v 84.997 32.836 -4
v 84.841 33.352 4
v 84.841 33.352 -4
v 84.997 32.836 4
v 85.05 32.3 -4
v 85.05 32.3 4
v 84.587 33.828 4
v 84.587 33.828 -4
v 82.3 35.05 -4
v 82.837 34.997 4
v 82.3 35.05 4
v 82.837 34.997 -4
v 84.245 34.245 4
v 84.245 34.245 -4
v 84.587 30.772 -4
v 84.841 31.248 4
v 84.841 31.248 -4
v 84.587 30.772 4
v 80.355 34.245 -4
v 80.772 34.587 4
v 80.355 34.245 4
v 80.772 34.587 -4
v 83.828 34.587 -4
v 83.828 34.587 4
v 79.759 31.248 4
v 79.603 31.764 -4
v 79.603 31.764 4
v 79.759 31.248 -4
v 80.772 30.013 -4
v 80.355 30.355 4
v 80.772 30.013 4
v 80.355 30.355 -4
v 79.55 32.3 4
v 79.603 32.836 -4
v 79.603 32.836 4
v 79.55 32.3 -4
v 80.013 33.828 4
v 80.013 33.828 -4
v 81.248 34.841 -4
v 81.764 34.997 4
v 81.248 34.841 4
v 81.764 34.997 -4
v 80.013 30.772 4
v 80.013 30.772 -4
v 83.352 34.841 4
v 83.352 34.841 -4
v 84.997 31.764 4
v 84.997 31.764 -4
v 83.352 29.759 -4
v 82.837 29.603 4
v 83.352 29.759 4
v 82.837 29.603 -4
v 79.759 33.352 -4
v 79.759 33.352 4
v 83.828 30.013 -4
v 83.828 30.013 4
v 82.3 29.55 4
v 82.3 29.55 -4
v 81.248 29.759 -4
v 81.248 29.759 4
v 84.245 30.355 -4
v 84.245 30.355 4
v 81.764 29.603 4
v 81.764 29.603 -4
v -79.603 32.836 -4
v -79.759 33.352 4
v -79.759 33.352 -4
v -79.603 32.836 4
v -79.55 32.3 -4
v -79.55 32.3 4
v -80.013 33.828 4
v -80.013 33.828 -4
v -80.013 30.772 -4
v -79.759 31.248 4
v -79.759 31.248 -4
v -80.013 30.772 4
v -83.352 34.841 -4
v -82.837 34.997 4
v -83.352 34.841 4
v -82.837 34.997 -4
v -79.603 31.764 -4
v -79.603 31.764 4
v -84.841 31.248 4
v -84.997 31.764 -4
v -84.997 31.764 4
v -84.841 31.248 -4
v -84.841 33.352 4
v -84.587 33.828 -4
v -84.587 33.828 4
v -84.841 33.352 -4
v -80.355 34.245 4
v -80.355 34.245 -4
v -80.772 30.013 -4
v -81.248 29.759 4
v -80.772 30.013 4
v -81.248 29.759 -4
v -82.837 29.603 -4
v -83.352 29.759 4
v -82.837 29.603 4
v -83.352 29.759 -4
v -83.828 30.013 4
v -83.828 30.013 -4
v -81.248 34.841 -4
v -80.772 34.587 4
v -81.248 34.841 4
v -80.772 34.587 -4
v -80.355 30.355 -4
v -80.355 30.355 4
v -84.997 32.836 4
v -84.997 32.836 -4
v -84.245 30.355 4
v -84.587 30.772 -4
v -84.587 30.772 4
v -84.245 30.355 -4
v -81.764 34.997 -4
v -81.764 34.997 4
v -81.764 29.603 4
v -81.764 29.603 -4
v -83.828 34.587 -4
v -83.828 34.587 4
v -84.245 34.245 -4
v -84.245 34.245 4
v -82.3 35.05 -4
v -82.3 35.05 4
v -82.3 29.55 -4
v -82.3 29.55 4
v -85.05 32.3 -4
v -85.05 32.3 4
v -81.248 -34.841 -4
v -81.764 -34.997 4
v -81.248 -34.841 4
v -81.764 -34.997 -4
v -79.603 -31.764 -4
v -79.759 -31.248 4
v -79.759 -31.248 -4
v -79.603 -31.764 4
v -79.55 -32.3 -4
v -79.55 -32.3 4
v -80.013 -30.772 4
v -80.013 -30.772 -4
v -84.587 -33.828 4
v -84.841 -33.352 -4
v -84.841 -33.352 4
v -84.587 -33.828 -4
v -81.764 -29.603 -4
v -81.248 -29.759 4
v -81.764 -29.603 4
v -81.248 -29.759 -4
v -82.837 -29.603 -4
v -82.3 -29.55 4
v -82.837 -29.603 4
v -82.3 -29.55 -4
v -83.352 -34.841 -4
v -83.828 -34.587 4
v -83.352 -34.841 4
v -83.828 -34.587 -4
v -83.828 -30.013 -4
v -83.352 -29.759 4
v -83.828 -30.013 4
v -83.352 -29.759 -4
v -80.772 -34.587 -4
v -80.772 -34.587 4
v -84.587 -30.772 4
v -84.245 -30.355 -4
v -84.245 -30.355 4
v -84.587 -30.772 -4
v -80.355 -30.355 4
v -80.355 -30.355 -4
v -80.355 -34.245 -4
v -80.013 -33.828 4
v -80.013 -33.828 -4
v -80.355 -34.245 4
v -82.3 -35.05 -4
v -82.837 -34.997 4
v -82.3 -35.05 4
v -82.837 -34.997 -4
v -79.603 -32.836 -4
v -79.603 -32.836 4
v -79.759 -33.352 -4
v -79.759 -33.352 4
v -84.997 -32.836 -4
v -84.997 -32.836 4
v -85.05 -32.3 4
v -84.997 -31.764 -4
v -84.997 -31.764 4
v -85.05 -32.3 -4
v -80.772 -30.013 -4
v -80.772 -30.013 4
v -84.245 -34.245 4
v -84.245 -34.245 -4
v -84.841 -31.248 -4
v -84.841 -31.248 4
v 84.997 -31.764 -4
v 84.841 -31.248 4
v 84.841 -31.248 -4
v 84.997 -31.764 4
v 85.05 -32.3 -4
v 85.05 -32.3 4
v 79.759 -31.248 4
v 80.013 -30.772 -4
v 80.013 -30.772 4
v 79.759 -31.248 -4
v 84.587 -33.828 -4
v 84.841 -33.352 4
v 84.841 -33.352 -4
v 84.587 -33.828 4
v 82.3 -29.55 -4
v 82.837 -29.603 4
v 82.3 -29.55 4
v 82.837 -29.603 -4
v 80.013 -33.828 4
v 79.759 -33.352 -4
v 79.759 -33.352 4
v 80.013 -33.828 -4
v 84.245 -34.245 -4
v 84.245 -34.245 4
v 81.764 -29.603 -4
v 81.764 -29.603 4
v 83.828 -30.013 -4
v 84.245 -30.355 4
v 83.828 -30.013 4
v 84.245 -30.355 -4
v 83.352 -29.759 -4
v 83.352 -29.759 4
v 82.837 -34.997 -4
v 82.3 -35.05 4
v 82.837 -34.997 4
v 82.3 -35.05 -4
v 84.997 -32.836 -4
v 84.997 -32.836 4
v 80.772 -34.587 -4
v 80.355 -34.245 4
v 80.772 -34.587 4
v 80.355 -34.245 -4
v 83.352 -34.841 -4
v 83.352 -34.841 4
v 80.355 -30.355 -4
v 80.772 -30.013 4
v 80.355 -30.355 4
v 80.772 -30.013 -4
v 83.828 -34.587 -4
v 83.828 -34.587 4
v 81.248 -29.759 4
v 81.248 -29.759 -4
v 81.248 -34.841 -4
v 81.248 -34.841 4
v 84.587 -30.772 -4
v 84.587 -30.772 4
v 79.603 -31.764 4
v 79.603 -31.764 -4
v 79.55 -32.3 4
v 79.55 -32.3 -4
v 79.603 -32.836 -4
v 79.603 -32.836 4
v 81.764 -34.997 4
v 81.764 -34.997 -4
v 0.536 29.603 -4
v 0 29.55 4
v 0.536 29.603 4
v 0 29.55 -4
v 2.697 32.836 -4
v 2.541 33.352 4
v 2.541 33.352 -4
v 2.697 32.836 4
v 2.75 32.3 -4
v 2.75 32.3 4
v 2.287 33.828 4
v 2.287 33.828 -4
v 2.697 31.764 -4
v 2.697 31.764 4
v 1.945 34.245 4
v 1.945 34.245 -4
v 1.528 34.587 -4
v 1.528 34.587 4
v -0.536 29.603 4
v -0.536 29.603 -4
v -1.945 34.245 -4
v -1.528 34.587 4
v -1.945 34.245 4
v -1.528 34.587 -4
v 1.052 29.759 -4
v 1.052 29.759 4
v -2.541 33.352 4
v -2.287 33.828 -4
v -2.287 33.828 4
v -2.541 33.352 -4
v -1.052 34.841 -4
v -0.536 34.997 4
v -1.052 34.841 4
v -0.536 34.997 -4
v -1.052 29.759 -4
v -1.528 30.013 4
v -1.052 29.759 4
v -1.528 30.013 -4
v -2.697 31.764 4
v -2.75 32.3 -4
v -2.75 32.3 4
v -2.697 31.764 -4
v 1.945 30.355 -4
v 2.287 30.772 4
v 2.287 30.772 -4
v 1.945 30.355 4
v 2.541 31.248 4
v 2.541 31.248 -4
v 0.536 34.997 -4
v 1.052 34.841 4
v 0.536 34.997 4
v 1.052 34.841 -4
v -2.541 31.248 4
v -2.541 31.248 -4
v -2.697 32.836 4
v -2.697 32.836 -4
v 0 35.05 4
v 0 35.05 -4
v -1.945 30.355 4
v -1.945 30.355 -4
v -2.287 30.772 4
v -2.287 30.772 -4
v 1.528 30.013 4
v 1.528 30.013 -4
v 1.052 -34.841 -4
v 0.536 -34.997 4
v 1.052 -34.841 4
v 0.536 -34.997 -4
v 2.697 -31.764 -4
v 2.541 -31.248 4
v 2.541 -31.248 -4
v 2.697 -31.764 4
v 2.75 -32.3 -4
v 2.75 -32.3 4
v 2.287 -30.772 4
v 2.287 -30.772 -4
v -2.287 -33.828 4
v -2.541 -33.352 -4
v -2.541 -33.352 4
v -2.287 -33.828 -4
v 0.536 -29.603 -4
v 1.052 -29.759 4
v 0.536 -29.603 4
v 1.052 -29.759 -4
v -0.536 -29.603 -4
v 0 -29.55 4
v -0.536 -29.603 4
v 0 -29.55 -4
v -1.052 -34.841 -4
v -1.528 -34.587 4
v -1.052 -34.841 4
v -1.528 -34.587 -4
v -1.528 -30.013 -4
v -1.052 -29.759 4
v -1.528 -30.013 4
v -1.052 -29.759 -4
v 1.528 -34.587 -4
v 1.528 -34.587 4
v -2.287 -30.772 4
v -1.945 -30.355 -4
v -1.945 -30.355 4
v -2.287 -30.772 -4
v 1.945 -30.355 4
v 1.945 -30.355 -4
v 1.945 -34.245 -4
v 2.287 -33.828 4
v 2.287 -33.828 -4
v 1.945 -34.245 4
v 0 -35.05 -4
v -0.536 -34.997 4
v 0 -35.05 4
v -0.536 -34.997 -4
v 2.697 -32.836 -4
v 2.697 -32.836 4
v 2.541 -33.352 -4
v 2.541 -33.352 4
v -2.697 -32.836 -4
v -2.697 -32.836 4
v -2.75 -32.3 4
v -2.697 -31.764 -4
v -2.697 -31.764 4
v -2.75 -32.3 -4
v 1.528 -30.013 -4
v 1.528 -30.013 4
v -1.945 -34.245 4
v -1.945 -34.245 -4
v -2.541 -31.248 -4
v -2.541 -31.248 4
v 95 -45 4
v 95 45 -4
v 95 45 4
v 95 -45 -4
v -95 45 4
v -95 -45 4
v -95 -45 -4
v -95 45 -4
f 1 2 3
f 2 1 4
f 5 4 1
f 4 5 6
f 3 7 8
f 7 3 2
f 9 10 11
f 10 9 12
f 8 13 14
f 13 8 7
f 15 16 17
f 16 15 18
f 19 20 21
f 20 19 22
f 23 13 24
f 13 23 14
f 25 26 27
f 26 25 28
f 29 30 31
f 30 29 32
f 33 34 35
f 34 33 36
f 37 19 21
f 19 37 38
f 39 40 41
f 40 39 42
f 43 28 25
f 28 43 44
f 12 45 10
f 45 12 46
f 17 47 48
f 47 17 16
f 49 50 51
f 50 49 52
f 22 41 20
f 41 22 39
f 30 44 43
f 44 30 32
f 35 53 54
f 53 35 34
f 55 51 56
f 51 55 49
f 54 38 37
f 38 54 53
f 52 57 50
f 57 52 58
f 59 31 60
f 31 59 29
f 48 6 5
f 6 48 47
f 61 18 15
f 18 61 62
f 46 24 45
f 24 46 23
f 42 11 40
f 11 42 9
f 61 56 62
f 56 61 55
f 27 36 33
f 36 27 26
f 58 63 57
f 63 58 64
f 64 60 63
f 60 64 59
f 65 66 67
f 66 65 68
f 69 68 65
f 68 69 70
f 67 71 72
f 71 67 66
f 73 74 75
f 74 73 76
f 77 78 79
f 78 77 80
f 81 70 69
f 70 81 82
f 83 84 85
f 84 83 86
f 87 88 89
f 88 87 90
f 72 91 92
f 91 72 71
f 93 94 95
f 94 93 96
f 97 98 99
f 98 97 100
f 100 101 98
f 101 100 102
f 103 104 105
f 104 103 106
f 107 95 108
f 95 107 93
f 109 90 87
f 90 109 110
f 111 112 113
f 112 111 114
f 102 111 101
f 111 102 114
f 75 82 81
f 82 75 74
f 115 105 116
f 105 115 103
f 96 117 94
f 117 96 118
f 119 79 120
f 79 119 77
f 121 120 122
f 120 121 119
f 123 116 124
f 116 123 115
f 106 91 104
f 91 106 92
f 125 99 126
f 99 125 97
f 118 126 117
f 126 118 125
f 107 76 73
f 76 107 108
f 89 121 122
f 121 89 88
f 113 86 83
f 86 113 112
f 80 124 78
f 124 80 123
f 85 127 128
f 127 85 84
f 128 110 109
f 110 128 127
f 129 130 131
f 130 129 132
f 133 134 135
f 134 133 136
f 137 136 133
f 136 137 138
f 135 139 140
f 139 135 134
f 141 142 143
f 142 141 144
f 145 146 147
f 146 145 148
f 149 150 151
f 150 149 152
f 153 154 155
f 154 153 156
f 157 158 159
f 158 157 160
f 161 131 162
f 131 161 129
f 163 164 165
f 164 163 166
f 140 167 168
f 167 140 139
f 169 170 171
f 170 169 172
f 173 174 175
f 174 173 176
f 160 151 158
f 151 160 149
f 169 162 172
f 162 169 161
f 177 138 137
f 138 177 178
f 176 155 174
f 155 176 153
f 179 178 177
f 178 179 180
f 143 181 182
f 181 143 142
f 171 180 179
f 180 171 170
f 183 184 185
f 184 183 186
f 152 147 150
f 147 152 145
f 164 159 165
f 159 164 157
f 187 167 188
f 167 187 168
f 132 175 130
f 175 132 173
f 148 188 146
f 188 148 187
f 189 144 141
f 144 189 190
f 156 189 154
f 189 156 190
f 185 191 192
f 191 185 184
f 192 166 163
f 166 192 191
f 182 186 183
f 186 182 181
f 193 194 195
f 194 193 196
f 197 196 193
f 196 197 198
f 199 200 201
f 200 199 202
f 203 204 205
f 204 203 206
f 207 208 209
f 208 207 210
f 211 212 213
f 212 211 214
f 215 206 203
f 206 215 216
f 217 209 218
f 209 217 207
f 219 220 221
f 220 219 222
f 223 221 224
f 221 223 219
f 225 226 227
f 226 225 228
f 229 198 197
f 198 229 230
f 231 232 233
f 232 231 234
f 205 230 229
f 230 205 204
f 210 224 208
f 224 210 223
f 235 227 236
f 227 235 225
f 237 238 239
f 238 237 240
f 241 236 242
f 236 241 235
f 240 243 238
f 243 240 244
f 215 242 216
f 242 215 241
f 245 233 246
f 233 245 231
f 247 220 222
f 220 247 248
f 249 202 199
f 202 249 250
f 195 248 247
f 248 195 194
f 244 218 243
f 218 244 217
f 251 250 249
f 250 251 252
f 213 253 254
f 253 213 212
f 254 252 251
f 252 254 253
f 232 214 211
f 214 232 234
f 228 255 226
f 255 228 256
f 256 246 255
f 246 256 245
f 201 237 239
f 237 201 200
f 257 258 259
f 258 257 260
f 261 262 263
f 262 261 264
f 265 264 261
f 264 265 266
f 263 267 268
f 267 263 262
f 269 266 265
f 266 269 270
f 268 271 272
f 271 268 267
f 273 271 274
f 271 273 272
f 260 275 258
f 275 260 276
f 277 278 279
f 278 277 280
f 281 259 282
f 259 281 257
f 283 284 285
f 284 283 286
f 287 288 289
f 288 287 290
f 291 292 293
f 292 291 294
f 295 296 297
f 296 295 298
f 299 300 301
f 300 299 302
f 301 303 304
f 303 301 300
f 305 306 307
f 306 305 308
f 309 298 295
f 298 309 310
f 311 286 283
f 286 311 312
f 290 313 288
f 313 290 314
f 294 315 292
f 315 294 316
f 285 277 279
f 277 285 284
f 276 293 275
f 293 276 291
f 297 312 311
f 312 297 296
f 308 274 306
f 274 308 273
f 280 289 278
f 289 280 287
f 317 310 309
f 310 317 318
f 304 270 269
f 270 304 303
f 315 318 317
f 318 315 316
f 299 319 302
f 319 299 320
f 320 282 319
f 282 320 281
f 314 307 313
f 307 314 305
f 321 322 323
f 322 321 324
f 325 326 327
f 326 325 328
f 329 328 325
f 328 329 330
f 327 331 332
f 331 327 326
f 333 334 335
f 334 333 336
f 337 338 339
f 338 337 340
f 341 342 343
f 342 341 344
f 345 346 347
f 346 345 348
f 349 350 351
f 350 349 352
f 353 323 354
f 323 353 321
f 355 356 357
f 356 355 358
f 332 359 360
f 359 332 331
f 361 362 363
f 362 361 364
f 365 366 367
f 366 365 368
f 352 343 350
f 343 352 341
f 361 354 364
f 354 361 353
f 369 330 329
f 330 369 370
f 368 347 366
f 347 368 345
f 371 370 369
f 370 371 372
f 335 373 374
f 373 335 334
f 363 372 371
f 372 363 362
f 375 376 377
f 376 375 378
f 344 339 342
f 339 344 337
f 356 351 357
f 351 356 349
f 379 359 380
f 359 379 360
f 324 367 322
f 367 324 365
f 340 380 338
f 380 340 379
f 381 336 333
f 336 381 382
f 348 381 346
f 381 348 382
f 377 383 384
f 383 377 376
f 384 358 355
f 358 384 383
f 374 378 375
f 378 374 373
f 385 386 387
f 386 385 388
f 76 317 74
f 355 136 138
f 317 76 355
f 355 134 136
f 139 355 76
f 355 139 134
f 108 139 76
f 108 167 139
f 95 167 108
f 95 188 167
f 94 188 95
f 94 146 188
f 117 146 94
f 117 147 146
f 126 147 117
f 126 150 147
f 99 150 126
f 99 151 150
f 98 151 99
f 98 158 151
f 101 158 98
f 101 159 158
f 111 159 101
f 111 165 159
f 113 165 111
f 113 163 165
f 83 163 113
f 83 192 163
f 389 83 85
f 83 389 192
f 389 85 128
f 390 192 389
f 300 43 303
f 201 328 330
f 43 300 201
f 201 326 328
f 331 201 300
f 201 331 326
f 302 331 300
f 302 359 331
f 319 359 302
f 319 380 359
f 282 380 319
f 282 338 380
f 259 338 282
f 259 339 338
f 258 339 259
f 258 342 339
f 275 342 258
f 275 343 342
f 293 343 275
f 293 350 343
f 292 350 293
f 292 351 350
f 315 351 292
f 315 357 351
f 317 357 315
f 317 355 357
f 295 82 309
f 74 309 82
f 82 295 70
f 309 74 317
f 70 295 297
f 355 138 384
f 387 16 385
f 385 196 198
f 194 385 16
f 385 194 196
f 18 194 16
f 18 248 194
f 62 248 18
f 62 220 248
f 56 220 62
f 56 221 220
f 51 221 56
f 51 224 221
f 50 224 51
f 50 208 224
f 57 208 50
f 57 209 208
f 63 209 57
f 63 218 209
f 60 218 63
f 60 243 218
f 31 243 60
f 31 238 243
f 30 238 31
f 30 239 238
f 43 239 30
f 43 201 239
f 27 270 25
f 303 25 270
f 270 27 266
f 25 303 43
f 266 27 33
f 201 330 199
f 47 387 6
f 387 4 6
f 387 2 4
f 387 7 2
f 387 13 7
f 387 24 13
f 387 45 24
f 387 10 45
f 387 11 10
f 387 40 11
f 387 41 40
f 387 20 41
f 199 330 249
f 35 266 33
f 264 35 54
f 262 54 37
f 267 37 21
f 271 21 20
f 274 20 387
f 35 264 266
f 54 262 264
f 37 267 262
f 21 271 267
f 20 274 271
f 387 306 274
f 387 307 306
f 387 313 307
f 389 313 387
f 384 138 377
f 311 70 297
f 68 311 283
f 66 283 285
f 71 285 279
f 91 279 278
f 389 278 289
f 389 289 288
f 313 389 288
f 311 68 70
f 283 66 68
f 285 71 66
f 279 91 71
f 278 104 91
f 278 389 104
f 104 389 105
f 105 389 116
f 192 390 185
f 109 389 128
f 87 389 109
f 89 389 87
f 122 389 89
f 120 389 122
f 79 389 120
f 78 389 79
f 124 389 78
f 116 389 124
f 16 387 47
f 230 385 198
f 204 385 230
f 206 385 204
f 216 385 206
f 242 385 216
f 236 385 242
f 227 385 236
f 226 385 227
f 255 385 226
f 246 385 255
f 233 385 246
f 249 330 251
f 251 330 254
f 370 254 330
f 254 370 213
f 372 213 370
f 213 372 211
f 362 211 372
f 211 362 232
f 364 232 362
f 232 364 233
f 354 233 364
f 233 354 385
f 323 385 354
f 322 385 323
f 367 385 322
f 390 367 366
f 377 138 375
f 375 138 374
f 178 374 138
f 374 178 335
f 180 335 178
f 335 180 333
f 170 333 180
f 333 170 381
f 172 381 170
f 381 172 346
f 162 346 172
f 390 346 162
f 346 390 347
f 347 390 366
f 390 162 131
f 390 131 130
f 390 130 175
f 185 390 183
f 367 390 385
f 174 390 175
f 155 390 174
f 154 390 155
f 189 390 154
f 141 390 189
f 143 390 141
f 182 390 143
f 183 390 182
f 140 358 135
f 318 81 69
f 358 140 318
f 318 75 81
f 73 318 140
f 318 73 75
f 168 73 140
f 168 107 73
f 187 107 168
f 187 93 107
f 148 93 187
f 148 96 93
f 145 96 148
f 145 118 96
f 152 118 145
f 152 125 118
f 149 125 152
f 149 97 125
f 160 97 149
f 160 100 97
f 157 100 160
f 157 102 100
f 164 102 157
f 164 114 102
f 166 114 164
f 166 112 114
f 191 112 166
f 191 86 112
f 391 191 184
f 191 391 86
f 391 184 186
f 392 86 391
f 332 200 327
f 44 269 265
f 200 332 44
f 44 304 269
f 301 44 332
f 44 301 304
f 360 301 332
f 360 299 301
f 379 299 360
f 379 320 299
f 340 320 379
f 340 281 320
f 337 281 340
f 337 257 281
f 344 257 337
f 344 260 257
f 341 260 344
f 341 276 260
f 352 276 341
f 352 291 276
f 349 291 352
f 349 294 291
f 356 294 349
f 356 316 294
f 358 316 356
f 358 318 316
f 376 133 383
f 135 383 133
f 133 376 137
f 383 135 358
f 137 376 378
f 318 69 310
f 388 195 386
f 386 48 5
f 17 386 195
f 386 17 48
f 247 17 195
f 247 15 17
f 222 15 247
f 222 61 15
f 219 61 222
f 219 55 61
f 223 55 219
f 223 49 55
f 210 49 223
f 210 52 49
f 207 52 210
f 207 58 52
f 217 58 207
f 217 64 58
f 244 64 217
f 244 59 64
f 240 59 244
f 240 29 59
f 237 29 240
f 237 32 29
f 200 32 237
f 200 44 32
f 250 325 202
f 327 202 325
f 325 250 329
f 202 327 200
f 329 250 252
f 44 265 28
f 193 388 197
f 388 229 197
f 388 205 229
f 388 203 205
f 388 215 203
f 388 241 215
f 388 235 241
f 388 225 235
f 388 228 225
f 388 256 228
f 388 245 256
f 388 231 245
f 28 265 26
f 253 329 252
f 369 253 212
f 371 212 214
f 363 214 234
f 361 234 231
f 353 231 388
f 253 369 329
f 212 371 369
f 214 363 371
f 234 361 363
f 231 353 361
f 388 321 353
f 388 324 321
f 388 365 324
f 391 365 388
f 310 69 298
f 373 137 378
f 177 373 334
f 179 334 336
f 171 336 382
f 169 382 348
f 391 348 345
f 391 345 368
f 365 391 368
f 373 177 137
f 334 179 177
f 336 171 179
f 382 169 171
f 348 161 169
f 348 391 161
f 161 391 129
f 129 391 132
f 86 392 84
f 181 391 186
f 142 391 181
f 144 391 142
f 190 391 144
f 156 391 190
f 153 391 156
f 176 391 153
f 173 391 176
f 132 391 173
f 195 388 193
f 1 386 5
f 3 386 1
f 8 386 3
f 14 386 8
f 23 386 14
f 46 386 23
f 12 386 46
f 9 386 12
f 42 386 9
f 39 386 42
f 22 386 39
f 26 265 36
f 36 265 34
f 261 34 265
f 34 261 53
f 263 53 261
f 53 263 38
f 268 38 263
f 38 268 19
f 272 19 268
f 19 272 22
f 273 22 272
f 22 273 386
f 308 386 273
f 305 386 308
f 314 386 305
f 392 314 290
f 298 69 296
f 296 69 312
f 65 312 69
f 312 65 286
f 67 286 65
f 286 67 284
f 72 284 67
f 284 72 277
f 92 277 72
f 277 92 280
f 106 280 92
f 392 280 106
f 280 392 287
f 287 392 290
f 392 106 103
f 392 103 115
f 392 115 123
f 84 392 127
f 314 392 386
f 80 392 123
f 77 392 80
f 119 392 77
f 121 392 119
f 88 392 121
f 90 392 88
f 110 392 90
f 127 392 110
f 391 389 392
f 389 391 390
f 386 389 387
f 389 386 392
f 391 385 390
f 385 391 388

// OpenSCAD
$fn = 32;

// ----------------------------------------------------------------------
// Corner plate 190 x 90 x 8
// 6 holes, centres taken from the edge offset
// ----------------------------------------------------------------------

// --- parameters (mm) ---
plate = [190, 90, 8];  // overall size (x, y, z)
holes = 6;             // number of holes the drawing asks for
hole_d = 5.5;          // hole diameter
edge = 12.7;           // hole centre offset from the plate edge

// --- derived feature positions (mm) ---
corner_x = plate[0] / 2 - edge;  // = 82.3   corner hole X
corner_y = plate[1] / 2 - edge;  // = 32.3   corner hole Y
feature_centers = [
  [corner_x, corner_y],
  [-corner_x, corner_y],
  [-corner_x, -corner_y],
  [corner_x, -corner_y],
  [0, corner_y],
  [0, -corner_y]
];   // hole centres the loop below drills

// plate outline, every hole drilled through with the same cutters
difference() {
  cube(plate, center = true);
  for (centre = feature_centers)
    translate([centre[0], centre[1], 0])
      cylinder(d = hole_d, h = plate[2] + 2, center = true);
}
